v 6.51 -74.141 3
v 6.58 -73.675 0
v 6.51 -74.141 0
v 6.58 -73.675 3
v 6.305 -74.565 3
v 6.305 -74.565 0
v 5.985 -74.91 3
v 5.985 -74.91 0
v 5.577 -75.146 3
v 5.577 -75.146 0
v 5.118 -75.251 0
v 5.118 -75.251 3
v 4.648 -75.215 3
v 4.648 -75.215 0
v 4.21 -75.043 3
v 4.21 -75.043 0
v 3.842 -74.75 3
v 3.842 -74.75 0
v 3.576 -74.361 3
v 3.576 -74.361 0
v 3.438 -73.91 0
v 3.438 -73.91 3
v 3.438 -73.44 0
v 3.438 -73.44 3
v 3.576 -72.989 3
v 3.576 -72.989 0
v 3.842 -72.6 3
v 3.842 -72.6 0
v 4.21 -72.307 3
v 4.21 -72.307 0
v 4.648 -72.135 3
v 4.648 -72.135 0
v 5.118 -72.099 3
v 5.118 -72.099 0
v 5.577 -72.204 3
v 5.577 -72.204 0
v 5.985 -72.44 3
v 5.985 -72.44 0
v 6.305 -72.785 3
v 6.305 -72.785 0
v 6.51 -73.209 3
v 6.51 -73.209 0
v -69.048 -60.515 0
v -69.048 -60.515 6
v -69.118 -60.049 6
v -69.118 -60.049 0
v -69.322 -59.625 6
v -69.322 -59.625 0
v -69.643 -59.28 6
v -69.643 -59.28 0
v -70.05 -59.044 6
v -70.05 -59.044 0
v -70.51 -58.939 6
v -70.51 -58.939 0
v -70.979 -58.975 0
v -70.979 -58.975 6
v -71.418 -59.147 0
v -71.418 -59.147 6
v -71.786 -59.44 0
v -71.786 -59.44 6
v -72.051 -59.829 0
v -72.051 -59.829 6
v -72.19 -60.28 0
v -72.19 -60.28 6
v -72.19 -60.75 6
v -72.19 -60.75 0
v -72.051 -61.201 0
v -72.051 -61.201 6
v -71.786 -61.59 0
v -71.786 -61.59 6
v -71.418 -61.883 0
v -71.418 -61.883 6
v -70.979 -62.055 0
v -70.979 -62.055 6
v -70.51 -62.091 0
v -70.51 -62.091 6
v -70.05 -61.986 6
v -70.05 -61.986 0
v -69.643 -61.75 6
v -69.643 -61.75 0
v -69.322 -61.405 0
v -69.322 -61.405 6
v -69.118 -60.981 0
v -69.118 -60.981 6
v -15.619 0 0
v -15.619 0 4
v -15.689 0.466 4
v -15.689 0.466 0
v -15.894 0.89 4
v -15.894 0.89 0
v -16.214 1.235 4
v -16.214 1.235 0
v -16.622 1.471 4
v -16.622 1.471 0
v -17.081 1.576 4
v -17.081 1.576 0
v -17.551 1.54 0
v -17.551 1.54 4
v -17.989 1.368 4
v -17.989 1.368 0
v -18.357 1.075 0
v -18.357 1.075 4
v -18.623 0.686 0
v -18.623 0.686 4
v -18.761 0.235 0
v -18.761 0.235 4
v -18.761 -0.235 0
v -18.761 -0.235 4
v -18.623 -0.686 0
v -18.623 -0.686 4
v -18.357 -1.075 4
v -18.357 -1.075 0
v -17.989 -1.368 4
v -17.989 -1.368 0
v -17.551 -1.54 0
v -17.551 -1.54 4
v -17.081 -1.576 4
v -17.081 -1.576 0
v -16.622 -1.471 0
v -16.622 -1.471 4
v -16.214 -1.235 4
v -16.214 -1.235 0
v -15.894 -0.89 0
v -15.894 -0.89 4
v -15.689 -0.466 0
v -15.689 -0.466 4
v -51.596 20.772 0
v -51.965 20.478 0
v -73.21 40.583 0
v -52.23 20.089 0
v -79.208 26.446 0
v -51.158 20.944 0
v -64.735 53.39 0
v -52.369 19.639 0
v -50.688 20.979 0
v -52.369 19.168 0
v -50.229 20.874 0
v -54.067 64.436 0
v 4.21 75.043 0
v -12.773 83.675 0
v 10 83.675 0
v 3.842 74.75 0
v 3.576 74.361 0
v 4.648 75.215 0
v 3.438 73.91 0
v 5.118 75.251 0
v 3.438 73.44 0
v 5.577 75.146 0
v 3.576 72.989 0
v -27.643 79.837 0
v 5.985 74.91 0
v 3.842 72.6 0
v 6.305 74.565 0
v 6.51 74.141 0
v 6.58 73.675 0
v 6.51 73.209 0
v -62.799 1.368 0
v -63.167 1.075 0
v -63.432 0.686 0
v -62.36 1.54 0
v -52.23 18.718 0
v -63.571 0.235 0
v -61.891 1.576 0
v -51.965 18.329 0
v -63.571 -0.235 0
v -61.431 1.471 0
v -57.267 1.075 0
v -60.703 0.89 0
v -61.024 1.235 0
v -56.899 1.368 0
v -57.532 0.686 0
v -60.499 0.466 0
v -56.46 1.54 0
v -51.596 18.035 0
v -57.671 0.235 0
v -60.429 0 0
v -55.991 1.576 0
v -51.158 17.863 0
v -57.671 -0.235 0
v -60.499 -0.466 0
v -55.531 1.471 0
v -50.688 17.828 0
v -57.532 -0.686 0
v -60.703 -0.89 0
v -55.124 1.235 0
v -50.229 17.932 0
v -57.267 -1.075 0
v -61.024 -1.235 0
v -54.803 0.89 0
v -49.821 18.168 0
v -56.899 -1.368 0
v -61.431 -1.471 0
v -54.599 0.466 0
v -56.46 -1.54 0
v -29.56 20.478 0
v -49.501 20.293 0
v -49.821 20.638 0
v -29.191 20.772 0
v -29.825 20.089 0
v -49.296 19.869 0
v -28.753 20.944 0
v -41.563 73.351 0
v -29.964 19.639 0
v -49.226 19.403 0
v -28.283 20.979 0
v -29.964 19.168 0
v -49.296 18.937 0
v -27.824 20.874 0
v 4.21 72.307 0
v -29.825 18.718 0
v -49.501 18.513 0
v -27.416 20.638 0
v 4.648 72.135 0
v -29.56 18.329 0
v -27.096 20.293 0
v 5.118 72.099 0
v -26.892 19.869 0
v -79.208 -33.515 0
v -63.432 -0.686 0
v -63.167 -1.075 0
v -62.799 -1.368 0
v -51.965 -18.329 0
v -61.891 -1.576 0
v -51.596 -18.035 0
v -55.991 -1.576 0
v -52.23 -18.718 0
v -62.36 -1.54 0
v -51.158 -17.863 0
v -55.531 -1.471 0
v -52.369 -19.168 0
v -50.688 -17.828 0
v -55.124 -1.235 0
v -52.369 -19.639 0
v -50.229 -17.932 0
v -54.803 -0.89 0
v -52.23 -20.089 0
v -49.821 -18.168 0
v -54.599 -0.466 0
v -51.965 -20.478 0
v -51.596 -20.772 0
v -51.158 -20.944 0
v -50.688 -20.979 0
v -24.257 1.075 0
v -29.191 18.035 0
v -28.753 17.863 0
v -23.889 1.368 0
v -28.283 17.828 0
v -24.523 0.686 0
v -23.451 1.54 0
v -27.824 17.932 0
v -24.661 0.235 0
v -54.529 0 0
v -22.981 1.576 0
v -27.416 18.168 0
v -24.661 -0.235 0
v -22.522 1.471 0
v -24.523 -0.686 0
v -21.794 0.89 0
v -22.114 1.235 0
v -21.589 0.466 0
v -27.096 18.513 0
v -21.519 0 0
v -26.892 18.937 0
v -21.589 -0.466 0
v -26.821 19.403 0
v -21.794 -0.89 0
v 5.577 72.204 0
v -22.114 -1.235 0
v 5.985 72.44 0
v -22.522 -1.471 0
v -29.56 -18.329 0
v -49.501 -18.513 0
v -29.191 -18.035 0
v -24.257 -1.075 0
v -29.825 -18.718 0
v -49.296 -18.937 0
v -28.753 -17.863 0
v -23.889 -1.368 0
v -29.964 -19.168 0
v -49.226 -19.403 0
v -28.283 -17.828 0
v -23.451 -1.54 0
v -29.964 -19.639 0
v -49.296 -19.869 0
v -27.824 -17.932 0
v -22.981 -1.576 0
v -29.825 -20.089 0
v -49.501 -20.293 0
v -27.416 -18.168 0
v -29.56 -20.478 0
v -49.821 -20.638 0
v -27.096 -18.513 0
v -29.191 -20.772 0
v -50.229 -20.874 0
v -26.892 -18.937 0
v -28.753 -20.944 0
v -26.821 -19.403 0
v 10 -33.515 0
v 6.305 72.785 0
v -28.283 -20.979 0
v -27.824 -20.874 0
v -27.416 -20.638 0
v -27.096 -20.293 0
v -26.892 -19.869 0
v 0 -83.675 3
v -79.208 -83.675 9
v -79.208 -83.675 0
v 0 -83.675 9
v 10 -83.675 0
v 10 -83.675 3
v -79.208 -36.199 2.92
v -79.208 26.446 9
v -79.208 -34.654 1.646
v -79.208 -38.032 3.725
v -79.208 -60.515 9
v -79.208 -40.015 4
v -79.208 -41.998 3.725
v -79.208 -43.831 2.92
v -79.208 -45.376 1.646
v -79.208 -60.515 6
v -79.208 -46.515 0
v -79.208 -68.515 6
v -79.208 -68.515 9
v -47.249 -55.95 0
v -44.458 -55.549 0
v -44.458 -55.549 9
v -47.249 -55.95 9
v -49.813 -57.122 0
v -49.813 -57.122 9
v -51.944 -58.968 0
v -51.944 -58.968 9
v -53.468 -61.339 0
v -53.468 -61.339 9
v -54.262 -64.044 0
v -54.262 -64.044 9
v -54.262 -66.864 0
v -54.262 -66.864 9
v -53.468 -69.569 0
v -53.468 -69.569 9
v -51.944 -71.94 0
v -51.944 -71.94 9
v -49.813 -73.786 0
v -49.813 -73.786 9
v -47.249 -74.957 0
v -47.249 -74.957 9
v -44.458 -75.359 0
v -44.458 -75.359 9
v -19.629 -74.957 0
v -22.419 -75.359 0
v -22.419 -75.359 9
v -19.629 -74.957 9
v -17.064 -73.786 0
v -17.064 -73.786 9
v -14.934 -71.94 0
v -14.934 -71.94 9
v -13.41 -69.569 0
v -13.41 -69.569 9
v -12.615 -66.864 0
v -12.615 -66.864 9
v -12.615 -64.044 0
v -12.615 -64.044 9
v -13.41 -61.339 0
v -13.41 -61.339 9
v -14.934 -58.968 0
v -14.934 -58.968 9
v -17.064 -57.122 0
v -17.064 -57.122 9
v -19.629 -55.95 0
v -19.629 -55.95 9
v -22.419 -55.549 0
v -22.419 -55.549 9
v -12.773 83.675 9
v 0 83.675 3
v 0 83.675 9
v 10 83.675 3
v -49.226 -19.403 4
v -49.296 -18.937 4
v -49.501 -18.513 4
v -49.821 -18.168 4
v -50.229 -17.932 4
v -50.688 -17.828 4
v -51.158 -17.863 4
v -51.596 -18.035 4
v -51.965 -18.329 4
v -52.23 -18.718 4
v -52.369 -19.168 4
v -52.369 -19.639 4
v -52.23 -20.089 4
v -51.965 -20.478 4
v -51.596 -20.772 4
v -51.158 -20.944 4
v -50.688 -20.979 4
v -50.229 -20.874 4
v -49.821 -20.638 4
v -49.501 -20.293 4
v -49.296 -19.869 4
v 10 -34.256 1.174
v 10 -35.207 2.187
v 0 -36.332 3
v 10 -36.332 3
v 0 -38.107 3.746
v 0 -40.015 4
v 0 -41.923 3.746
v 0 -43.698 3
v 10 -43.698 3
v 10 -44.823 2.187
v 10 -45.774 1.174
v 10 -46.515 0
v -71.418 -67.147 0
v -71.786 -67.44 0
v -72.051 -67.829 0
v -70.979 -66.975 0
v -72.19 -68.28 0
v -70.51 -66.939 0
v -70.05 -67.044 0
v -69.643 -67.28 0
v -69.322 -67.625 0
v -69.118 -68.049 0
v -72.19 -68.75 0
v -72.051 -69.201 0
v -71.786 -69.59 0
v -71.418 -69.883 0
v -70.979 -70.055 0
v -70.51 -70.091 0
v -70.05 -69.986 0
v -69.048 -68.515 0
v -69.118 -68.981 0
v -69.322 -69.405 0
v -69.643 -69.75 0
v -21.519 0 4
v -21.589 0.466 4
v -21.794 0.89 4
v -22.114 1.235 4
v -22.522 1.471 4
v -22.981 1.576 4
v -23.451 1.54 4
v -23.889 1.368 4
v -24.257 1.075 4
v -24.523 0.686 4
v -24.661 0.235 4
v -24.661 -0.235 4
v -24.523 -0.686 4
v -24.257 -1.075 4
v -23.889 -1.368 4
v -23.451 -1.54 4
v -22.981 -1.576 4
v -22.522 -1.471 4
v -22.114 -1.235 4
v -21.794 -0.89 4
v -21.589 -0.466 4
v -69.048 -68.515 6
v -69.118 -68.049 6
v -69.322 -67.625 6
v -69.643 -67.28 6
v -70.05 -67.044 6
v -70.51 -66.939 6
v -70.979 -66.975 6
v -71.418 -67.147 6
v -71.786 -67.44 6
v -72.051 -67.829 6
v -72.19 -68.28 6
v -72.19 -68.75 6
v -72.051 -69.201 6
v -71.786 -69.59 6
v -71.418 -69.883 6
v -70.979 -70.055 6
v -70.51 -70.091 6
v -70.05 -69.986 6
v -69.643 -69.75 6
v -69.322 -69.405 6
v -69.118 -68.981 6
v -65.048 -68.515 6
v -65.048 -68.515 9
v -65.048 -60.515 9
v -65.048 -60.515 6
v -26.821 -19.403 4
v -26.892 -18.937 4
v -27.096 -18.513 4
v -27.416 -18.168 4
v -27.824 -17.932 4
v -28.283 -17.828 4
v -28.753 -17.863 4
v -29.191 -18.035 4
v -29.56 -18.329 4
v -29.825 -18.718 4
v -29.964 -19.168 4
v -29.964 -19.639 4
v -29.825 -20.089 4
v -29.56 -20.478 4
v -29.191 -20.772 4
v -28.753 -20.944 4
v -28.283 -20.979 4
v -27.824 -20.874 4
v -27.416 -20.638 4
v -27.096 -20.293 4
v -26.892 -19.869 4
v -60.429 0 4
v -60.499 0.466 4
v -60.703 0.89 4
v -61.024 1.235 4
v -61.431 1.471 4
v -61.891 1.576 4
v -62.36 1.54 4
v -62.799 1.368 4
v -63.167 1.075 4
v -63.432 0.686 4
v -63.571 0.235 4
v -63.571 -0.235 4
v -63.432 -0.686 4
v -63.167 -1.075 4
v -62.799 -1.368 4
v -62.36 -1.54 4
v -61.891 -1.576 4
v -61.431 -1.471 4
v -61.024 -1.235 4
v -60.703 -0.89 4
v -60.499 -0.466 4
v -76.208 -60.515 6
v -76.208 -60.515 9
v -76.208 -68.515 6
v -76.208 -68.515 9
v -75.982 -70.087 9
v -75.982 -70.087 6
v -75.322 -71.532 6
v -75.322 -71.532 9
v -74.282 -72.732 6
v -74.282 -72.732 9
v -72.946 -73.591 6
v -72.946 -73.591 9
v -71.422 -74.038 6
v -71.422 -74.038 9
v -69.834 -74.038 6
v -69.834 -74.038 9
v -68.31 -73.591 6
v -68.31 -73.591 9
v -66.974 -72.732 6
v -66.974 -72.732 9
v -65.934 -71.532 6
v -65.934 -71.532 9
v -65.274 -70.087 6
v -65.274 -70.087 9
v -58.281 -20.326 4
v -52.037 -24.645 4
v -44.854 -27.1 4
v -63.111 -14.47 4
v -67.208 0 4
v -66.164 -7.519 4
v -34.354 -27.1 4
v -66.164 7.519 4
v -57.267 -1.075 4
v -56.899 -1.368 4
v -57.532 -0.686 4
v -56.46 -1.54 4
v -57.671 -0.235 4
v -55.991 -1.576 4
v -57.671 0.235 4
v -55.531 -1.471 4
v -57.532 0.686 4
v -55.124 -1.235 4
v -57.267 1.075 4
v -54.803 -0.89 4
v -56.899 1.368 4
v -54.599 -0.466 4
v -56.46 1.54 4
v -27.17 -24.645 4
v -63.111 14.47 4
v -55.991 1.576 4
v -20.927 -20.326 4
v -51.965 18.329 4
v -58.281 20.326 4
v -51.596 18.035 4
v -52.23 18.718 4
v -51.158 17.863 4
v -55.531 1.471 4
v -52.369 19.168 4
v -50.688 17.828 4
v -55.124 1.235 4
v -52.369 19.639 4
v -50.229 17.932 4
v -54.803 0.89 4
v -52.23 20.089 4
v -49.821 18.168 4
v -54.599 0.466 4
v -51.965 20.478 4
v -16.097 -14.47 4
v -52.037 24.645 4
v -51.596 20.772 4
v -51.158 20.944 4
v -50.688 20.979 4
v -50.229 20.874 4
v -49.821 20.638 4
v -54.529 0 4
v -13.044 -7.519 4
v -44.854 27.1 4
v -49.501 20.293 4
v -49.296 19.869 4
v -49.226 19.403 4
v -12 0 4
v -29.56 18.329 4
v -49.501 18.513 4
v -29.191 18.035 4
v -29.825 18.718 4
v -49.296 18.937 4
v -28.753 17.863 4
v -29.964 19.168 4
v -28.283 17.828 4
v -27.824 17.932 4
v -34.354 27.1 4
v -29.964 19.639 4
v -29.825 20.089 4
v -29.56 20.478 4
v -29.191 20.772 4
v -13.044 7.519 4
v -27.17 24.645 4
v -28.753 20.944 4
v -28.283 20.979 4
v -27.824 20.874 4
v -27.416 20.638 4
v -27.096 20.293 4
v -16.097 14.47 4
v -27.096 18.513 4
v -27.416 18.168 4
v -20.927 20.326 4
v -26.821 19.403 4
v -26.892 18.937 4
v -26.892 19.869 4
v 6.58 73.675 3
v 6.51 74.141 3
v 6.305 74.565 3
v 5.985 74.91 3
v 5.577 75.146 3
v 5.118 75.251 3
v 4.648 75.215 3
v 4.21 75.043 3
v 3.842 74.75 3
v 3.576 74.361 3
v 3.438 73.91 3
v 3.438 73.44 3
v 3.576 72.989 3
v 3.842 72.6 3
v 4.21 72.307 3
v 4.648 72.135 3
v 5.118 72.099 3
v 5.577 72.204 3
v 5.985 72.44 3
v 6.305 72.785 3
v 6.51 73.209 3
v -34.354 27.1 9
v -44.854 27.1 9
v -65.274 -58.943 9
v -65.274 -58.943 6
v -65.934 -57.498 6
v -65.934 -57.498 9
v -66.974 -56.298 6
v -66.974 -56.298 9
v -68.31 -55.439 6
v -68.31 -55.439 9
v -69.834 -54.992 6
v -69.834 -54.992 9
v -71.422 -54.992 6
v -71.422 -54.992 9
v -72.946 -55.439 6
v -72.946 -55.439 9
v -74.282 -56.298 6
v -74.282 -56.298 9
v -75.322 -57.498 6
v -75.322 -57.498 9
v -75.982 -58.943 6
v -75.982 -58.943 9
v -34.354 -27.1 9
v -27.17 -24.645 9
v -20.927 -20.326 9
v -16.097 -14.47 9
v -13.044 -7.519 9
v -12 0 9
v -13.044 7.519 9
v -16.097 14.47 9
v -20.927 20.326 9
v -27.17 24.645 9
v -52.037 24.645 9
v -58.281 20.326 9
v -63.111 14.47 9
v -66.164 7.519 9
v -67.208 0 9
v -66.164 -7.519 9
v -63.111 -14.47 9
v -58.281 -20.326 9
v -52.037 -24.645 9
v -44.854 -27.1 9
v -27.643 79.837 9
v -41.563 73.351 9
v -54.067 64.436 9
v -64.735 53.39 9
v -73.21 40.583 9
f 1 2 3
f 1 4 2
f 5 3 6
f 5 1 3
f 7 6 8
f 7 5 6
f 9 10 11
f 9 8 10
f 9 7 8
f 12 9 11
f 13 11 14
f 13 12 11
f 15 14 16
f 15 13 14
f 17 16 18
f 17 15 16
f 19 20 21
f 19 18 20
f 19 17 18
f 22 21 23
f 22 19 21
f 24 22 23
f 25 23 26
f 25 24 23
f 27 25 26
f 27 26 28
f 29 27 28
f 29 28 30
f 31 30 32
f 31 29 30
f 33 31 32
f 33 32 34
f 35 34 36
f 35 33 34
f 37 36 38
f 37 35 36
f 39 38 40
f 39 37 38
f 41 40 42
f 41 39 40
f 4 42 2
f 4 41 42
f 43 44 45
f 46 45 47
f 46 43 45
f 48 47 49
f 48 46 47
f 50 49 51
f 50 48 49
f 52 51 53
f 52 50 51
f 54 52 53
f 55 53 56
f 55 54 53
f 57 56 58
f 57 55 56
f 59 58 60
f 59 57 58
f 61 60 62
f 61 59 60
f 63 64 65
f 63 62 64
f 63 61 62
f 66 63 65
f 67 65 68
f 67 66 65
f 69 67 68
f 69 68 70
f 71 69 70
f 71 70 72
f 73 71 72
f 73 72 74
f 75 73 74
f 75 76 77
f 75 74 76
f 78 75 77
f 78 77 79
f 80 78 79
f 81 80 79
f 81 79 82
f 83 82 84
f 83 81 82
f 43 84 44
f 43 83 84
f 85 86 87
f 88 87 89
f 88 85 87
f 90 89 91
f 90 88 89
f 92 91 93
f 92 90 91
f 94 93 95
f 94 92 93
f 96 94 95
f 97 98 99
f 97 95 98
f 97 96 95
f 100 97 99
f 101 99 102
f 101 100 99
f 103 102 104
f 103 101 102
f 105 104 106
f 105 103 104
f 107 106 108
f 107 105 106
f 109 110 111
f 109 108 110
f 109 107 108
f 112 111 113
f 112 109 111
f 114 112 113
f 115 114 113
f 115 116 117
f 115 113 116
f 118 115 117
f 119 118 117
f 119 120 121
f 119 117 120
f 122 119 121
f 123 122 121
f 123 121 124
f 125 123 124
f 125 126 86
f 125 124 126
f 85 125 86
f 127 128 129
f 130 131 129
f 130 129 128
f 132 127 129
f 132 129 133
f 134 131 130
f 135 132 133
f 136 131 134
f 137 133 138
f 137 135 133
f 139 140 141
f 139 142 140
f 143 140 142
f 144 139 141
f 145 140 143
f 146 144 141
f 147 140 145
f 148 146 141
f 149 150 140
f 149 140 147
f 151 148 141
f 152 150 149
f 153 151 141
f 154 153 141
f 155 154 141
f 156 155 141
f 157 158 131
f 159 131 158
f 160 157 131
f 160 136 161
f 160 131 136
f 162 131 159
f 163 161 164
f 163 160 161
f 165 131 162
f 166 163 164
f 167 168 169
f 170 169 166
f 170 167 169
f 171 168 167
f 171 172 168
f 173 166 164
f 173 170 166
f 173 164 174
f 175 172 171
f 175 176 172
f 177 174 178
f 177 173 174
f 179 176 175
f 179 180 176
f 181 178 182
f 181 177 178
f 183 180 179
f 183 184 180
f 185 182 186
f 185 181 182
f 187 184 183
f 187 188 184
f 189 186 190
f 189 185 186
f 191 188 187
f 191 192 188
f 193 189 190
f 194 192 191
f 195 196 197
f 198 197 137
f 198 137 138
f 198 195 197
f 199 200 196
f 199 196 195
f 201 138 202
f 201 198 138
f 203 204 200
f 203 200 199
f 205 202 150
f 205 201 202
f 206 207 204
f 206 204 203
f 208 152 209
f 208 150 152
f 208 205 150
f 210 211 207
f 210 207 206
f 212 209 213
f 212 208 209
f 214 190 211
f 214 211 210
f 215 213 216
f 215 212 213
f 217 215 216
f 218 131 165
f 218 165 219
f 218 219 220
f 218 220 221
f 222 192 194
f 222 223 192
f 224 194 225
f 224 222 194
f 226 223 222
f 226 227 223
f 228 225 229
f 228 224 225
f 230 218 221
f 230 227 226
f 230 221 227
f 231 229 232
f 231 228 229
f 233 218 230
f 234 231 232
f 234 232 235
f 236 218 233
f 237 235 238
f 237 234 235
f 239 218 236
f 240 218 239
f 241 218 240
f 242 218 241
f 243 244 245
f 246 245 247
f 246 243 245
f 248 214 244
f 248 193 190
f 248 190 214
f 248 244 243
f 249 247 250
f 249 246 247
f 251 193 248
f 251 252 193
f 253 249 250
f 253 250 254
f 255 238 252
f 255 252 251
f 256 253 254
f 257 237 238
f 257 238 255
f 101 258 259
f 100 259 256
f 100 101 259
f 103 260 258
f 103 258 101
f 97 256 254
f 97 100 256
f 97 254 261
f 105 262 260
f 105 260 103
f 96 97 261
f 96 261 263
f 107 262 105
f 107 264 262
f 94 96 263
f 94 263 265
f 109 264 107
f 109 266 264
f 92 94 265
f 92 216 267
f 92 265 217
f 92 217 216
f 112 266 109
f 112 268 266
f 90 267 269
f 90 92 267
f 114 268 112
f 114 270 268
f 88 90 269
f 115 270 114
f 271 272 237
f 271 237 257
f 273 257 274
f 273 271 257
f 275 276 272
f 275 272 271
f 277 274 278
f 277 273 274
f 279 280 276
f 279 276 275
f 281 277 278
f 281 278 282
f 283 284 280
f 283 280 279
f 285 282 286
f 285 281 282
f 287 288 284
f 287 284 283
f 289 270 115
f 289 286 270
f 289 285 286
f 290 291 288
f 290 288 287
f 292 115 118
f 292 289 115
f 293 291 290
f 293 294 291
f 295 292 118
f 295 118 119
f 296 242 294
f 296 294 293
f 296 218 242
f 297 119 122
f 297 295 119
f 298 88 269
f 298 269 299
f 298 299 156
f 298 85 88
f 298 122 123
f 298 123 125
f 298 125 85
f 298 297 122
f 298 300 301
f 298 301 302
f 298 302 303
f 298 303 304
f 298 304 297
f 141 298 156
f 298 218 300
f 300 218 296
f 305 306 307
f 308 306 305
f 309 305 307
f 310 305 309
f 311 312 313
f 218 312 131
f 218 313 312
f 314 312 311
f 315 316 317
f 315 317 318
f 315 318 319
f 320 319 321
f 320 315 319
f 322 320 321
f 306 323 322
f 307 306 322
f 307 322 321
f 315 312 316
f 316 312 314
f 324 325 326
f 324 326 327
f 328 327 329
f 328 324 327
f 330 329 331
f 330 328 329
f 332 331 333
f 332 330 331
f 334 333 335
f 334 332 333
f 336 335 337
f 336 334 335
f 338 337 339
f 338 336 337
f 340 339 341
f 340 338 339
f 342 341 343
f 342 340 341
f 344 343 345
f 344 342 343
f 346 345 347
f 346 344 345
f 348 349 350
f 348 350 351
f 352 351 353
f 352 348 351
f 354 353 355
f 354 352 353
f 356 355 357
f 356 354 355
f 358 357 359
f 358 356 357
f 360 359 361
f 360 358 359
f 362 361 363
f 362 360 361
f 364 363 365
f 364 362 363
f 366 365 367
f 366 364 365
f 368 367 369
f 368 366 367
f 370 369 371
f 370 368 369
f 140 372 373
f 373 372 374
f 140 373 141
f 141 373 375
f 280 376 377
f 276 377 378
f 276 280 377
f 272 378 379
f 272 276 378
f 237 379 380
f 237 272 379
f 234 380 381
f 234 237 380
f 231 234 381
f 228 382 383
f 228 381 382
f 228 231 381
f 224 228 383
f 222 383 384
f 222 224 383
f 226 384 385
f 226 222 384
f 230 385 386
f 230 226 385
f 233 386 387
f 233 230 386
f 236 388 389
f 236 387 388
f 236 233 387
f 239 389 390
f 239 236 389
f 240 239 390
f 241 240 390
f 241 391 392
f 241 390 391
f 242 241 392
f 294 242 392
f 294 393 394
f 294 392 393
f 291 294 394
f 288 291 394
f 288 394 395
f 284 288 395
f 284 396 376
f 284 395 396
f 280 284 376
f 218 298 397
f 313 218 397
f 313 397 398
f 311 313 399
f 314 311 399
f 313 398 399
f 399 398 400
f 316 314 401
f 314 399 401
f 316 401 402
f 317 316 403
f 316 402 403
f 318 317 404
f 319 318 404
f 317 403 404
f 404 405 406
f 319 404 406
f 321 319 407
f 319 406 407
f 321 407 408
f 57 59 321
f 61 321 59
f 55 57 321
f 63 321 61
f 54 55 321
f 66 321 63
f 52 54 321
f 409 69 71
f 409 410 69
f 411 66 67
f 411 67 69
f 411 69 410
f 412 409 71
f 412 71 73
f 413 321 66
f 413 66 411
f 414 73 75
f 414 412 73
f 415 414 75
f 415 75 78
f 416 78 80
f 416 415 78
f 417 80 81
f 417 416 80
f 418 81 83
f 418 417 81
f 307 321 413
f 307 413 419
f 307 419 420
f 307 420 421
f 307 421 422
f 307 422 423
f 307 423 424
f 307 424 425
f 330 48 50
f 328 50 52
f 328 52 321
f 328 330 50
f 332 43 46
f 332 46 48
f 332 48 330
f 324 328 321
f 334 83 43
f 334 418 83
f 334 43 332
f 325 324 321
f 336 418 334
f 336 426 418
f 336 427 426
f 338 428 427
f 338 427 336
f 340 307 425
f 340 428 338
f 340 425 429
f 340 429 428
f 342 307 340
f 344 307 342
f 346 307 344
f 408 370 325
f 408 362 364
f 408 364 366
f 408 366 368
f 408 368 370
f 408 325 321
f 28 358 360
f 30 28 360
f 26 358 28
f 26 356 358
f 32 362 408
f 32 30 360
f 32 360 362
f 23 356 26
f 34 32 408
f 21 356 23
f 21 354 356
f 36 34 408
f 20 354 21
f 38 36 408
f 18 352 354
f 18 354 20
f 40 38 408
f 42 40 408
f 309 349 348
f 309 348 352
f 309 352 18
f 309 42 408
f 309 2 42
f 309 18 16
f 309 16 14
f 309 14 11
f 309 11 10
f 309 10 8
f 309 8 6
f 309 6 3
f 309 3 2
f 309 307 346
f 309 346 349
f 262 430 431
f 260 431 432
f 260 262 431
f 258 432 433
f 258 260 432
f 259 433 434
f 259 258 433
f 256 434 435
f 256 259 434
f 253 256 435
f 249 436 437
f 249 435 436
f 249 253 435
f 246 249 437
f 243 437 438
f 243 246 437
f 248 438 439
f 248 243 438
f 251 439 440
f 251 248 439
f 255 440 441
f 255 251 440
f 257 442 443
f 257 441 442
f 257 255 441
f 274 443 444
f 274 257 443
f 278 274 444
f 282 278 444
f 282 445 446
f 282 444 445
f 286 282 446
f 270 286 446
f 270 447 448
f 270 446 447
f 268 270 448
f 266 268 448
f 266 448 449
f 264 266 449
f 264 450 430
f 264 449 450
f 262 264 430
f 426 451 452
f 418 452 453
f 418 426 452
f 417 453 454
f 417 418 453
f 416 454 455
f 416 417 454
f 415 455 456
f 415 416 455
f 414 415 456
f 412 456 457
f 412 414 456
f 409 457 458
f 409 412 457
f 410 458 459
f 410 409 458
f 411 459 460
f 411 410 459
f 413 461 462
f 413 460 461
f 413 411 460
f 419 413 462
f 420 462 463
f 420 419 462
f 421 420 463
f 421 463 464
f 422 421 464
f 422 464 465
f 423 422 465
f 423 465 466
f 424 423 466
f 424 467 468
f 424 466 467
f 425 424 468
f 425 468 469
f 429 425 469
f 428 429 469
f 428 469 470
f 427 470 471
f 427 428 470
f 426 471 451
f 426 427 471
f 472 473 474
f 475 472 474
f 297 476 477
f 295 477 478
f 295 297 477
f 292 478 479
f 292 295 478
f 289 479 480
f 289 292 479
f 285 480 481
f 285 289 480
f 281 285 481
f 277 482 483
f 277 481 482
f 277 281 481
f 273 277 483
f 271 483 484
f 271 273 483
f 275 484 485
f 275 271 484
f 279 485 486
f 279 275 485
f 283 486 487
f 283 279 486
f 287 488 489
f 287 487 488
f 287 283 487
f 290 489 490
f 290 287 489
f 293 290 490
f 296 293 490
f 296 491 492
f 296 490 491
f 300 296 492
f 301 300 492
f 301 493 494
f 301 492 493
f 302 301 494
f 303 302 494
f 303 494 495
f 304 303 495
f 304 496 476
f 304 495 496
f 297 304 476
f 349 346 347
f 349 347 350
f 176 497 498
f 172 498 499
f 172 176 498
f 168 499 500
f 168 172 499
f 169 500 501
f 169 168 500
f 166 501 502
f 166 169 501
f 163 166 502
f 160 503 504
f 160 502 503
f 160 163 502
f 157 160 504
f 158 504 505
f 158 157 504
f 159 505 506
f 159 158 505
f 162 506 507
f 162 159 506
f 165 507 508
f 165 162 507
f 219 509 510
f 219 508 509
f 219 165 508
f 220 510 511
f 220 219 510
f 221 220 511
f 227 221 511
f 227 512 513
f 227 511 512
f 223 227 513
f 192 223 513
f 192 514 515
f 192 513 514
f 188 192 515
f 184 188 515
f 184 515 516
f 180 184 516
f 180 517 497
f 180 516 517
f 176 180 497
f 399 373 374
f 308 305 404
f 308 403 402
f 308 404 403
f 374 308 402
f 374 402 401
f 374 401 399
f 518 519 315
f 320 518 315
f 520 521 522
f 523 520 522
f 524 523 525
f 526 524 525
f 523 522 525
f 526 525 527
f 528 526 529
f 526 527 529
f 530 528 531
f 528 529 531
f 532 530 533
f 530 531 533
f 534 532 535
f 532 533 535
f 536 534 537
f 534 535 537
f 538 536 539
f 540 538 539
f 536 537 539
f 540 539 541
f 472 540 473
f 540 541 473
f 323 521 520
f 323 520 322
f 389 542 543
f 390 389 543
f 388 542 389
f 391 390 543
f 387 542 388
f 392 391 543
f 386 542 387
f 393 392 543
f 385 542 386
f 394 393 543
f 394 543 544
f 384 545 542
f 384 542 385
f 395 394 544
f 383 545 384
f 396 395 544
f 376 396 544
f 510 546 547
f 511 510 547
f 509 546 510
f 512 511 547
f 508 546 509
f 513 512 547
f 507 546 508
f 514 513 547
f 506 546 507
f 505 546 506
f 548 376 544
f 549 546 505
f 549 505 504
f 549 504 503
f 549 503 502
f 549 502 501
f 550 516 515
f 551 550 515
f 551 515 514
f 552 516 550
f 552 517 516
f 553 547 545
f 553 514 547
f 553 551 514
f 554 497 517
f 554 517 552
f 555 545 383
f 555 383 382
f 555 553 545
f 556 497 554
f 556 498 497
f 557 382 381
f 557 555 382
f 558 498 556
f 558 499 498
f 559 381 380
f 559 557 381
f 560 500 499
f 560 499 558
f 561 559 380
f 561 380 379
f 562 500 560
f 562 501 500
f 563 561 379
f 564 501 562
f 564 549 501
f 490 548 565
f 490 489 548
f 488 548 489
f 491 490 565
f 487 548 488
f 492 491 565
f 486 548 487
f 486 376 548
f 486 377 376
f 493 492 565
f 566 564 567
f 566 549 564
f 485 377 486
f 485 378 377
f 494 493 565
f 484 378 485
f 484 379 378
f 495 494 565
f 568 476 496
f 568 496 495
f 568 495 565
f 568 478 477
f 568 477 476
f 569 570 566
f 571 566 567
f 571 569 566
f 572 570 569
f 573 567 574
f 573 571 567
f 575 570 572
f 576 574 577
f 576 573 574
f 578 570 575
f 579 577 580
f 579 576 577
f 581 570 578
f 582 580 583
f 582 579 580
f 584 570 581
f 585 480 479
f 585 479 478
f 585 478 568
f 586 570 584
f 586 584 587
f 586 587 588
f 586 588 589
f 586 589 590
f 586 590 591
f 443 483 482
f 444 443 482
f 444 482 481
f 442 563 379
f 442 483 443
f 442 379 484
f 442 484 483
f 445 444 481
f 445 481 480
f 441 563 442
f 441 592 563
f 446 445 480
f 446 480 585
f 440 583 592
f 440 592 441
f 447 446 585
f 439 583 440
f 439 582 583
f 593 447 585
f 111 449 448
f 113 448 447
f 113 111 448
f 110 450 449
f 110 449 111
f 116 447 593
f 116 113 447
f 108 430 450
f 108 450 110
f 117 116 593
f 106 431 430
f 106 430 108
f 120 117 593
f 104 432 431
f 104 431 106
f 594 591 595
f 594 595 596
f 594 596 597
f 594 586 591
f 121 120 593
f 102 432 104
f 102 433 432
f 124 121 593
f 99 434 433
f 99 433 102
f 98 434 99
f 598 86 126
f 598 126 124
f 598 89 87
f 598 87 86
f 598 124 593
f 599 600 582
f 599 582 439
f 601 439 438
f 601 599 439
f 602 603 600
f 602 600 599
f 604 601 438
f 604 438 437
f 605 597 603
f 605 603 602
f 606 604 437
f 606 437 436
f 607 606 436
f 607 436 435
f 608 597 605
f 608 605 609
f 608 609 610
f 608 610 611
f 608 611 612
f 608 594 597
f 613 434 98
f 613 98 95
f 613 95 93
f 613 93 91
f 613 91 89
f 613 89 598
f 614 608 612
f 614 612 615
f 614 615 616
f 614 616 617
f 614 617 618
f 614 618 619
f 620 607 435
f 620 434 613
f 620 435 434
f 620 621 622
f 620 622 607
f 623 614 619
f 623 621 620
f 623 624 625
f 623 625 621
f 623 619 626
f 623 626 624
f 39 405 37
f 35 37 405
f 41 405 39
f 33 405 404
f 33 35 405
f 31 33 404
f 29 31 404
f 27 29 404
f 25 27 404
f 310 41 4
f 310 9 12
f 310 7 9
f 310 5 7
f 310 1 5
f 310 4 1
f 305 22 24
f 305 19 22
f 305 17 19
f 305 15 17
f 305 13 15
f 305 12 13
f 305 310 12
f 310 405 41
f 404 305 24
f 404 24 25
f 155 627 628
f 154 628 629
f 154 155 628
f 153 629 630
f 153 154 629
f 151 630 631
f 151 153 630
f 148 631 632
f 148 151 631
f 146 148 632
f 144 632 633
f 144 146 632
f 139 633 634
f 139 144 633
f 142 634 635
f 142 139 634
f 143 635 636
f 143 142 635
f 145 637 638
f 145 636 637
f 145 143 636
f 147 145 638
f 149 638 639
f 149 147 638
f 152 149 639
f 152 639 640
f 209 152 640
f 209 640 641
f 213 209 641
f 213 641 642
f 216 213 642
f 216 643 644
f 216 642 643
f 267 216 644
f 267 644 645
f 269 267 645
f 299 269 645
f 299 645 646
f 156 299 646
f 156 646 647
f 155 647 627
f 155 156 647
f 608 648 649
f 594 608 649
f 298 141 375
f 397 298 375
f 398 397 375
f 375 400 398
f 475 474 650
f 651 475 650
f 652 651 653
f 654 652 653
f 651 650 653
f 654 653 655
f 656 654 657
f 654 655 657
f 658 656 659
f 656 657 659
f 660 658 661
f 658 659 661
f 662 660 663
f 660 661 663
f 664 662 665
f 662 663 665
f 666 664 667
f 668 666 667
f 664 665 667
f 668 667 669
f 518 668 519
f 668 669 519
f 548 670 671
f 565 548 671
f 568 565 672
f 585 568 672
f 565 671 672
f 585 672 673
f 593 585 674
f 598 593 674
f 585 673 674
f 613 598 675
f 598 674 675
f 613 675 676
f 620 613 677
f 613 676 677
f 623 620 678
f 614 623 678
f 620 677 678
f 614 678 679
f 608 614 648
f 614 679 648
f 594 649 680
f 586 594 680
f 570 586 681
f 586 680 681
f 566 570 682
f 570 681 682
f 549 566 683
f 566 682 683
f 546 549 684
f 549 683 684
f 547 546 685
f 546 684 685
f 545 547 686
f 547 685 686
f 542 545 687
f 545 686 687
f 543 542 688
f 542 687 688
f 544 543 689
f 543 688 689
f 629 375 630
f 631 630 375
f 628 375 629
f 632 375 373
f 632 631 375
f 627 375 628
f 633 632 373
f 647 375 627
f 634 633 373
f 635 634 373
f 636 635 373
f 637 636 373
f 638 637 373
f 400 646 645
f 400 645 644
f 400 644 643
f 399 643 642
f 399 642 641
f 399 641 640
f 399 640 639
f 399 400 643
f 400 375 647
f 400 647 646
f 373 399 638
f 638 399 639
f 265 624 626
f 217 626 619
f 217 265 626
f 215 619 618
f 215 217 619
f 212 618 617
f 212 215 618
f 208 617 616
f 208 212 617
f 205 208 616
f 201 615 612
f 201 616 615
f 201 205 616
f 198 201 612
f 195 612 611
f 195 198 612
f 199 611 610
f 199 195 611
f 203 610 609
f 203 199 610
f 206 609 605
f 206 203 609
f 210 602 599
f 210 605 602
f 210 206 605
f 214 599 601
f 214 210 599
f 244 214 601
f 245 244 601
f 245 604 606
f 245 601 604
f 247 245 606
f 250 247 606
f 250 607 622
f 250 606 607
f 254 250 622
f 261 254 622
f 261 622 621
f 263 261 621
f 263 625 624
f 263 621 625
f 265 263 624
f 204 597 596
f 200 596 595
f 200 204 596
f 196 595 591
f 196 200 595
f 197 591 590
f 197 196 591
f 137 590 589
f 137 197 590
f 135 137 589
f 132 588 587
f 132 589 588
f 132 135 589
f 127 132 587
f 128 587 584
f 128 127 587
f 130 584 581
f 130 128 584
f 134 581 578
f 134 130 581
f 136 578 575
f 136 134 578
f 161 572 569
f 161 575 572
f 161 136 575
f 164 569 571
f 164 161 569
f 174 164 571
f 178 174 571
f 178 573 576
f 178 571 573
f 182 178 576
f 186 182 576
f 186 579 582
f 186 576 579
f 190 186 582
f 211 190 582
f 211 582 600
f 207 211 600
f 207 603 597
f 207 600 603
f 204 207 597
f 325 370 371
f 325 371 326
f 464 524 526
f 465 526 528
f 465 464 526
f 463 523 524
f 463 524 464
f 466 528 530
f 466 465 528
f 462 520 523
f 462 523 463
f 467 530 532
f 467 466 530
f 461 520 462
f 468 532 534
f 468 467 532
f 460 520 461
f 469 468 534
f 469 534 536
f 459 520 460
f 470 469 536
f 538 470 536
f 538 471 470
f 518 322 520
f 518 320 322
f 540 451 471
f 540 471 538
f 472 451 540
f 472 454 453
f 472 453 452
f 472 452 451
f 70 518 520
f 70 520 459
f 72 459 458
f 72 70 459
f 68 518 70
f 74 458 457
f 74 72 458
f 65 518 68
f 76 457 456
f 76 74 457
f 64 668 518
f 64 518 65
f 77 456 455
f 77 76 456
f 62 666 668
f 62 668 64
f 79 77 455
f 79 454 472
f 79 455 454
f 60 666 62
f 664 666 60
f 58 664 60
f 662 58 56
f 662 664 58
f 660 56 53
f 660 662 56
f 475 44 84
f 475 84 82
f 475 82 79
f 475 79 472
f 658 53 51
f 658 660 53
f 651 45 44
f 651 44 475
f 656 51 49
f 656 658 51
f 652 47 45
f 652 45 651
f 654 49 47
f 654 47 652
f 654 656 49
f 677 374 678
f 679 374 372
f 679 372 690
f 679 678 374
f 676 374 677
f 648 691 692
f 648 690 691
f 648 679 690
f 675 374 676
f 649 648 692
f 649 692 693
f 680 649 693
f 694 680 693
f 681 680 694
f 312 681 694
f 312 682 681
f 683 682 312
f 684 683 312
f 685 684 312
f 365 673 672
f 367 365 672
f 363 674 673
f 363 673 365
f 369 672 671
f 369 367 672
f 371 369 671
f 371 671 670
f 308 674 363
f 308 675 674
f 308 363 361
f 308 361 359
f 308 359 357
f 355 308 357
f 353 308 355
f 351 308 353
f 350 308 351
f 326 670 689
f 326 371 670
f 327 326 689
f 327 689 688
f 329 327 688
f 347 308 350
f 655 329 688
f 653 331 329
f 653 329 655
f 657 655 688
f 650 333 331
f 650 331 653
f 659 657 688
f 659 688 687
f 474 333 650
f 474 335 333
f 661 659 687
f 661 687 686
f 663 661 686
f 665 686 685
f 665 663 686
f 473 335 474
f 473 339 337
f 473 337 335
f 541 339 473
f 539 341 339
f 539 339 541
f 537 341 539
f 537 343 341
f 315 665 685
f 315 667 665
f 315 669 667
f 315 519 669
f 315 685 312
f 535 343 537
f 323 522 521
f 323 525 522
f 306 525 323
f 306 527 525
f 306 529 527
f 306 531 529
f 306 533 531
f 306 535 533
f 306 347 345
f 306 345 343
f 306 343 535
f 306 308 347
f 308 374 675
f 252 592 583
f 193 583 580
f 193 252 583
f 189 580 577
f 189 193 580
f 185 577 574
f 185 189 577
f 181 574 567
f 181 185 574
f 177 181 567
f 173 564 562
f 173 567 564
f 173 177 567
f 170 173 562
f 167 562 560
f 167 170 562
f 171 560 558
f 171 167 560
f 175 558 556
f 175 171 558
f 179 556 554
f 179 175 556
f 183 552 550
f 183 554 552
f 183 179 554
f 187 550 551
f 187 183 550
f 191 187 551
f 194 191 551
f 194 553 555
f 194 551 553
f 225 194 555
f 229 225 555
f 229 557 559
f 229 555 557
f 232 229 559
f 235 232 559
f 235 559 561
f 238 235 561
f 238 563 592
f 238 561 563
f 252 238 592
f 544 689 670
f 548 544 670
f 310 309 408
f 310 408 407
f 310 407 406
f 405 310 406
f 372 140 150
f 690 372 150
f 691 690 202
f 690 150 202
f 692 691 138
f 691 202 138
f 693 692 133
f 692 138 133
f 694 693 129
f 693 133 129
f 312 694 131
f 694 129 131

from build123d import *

# Parameters (mm, degrees)
PAD_DEPTH            = 83.675
POCKET001_DEPTH      = 5
SKETCH003_R          = 1.58
POCKET002_DEPTH      = 9.001
SKETCH006_R          = 1.58
POCKET_DEPTH         = 379.711606
POCKET_DEPTH_BACK    = 388.711606
SKETCH008_R          = 1.58
POCKET004_DEPTH      = 0.001
POCKET004_DEPTH_BACK = 9.001
POCKET005_DEPTH      = 0.001
POCKET005_DEPTH_BACK = 9.001
POCKET006_DEPTH      = 79.208699
POCKET006_DEPTH_BACK = 10.001
POCKET007_DEPTH      = 0.001
POCKET007_DEPTH_BACK = 9.001
POCKET008_DEPTH      = 3


with BuildPart() as part:
    # Sketch → Pad (new body, symmetric)
    with BuildSketch(Plane.XZ):
        Polygon((-6, 9), (-79.207699, 9), (-79.207699, 0), (0, 0), (10, 0), (10, 3), (0, 3), (0, 9), align=None)
    extrude(amount=PAD_DEPTH, both=True)

    # Sketch002 → Pocket001 (cut)
    with BuildSketch(Plane.XY.offset(9)):
        with BuildLine():
            Line((-34.353849, 27.1), (-39.603849, 27.1))
            Line((-39.603849, 27.1), (-44.853849, 27.1))
            ThreePointArc((-44.853849, 27.1), (-67.207699, 0), (-44.853849, -27.1))
            Line((-44.853849, -27.1), (-34.353849, -27.1))
            ThreePointArc((-34.353849, -27.1), (-12, 0), (-34.353849, 27.1))
        make_face()
    extrude(amount=-POCKET001_DEPTH, mode=Mode.SUBTRACT)

    # Sketch003 → Pocket002 (cut, through all)
    with BuildSketch(Plane.XY):
        with Locations((-50.806289, -19.403194)):
            Circle(SKETCH003_R)
        with Locations((-28.40141, -19.403194)):
            Circle(SKETCH003_R)
        with Locations((-28.40141, 19.403194)):
            Circle(SKETCH003_R)
        with Locations((-50.806289, 19.403194)):
            Circle(SKETCH003_R)
        with Locations((-62.008728, 0)):
            Circle(SKETCH003_R)
        with Locations((-56.108728, 0)):
            Circle(SKETCH003_R)
        with Locations((-17.198971, 0)):
            Circle(SKETCH003_R)
        with Locations((-23.098971, 0)):
            Circle(SKETCH003_R)
    extrude(amount=POCKET002_DEPTH, mode=Mode.SUBTRACT)

    # Sketch006 → Pocket (cut, two sides)
    with BuildSketch(Plane.XY) as pocket_sk:
        with Locations((5, 73.675)):
            Circle(SKETCH006_R)
    pocket = extrude(amount=-POCKET_DEPTH, mode=Mode.SUBTRACT) + extrude(pocket_sk.sketch, amount=POCKET_DEPTH_BACK, mode=Mode.SUBTRACT)

    # Mirrored: Pocket across Sketch006 H_Axis
    add(pocket.mirror(Plane.ZX), mode=Mode.SUBTRACT)

    # Sketch008 → Pocket004 (cut, two sides)
    with BuildSketch(Plane.XY) as pocket004_sk:
        with Locations((-70.627699, -68.515)):
            Circle(SKETCH008_R)
        with Locations((-70.627699, -60.515)):
            Circle(SKETCH008_R)
    extrude(amount=-POCKET004_DEPTH, mode=Mode.SUBTRACT)
    extrude(pocket004_sk.sketch, amount=POCKET004_DEPTH_BACK, mode=Mode.SUBTRACT)

    # Sketch005 → Pocket005 (cut, two sides)
    with BuildSketch(Plane.XY) as pocket005_sk:
        with BuildLine():
            ThreePointArc((-5.147488, 84.556872), (-51.101438, 66.874328), (-79.207699, 26.445674))
            Line((-79.207699, 26.445674), (-107.360429, 26.445674))
            Line((-107.360429, 26.445674), (-107.360429, 113.139377))
            Line((-5.147488, 113.139377), (-107.360429, 113.139377))
            Line((-5.147488, 84.556872), (-5.147488, 113.139377))
        make_face()
    extrude(amount=-POCKET005_DEPTH, mode=Mode.SUBTRACT)
    extrude(pocket005_sk.sketch, amount=POCKET005_DEPTH_BACK, mode=Mode.SUBTRACT)

    # Sketch009 → Pocket006 (cut, two sides)
    with BuildSketch(Plane.YZ) as pocket006_sk:
        with BuildLine():
            ThreePointArc((-33.515, 0), (-40.015, 4), (-46.515, 0))
            Line((-40.015, 0), (-46.515, 0))
            Line((-40.015, 0), (-33.515, 0))
        make_face()
    extrude(amount=-POCKET006_DEPTH, mode=Mode.SUBTRACT)
    extrude(pocket006_sk.sketch, amount=POCKET006_DEPTH_BACK, mode=Mode.SUBTRACT)

    # Sketch010 → Pocket007 (cut, two sides)
    with BuildSketch(Plane.XY) as pocket007_sk:
        with BuildLine():
            ThreePointArc((-44.458302, -55.549289), (-54.363008, -65.453995), (-44.458302, -75.358701))
            Line((-44.458302, -75.358701), (-22.419182, -75.358701))
            ThreePointArc((-22.419182, -75.358701), (-12.514476, -65.453995), (-22.419182, -55.549289))
            Line((-22.419182, -55.549289), (-44.458302, -55.549289))
        make_face()
    extrude(amount=-POCKET007_DEPTH, mode=Mode.SUBTRACT)
    extrude(pocket007_sk.sketch, amount=POCKET007_DEPTH_BACK, mode=Mode.SUBTRACT)

    # Sketch007 → Pocket008 (cut)
    with BuildSketch(Plane.XY.offset(9)):
        with BuildLine():
            Line((-79.207699, -64.515), (-79.207699, -68.515))
            Line((-76.207699, -68.515), (-79.207699, -68.515))
            ThreePointArc((-76.207699, -68.515), (-70.627699, -74.095), (-65.047699, -68.515))
            Line((-65.047699, -68.515), (-65.047699, -64.515))
            Line((-65.047699, -60.515), (-65.047699, -64.515))
            ThreePointArc((-65.047699, -60.515), (-70.627699, -54.935), (-76.207699, -60.515))
            Line((-76.207699, -60.515), (-79.207699, -60.515))
            Line((-79.207699, -64.515), (-79.207699, -60.515))
        make_face()
    extrude(amount=-POCKET008_DEPTH, mode=Mode.SUBTRACT)


solid = part.part
